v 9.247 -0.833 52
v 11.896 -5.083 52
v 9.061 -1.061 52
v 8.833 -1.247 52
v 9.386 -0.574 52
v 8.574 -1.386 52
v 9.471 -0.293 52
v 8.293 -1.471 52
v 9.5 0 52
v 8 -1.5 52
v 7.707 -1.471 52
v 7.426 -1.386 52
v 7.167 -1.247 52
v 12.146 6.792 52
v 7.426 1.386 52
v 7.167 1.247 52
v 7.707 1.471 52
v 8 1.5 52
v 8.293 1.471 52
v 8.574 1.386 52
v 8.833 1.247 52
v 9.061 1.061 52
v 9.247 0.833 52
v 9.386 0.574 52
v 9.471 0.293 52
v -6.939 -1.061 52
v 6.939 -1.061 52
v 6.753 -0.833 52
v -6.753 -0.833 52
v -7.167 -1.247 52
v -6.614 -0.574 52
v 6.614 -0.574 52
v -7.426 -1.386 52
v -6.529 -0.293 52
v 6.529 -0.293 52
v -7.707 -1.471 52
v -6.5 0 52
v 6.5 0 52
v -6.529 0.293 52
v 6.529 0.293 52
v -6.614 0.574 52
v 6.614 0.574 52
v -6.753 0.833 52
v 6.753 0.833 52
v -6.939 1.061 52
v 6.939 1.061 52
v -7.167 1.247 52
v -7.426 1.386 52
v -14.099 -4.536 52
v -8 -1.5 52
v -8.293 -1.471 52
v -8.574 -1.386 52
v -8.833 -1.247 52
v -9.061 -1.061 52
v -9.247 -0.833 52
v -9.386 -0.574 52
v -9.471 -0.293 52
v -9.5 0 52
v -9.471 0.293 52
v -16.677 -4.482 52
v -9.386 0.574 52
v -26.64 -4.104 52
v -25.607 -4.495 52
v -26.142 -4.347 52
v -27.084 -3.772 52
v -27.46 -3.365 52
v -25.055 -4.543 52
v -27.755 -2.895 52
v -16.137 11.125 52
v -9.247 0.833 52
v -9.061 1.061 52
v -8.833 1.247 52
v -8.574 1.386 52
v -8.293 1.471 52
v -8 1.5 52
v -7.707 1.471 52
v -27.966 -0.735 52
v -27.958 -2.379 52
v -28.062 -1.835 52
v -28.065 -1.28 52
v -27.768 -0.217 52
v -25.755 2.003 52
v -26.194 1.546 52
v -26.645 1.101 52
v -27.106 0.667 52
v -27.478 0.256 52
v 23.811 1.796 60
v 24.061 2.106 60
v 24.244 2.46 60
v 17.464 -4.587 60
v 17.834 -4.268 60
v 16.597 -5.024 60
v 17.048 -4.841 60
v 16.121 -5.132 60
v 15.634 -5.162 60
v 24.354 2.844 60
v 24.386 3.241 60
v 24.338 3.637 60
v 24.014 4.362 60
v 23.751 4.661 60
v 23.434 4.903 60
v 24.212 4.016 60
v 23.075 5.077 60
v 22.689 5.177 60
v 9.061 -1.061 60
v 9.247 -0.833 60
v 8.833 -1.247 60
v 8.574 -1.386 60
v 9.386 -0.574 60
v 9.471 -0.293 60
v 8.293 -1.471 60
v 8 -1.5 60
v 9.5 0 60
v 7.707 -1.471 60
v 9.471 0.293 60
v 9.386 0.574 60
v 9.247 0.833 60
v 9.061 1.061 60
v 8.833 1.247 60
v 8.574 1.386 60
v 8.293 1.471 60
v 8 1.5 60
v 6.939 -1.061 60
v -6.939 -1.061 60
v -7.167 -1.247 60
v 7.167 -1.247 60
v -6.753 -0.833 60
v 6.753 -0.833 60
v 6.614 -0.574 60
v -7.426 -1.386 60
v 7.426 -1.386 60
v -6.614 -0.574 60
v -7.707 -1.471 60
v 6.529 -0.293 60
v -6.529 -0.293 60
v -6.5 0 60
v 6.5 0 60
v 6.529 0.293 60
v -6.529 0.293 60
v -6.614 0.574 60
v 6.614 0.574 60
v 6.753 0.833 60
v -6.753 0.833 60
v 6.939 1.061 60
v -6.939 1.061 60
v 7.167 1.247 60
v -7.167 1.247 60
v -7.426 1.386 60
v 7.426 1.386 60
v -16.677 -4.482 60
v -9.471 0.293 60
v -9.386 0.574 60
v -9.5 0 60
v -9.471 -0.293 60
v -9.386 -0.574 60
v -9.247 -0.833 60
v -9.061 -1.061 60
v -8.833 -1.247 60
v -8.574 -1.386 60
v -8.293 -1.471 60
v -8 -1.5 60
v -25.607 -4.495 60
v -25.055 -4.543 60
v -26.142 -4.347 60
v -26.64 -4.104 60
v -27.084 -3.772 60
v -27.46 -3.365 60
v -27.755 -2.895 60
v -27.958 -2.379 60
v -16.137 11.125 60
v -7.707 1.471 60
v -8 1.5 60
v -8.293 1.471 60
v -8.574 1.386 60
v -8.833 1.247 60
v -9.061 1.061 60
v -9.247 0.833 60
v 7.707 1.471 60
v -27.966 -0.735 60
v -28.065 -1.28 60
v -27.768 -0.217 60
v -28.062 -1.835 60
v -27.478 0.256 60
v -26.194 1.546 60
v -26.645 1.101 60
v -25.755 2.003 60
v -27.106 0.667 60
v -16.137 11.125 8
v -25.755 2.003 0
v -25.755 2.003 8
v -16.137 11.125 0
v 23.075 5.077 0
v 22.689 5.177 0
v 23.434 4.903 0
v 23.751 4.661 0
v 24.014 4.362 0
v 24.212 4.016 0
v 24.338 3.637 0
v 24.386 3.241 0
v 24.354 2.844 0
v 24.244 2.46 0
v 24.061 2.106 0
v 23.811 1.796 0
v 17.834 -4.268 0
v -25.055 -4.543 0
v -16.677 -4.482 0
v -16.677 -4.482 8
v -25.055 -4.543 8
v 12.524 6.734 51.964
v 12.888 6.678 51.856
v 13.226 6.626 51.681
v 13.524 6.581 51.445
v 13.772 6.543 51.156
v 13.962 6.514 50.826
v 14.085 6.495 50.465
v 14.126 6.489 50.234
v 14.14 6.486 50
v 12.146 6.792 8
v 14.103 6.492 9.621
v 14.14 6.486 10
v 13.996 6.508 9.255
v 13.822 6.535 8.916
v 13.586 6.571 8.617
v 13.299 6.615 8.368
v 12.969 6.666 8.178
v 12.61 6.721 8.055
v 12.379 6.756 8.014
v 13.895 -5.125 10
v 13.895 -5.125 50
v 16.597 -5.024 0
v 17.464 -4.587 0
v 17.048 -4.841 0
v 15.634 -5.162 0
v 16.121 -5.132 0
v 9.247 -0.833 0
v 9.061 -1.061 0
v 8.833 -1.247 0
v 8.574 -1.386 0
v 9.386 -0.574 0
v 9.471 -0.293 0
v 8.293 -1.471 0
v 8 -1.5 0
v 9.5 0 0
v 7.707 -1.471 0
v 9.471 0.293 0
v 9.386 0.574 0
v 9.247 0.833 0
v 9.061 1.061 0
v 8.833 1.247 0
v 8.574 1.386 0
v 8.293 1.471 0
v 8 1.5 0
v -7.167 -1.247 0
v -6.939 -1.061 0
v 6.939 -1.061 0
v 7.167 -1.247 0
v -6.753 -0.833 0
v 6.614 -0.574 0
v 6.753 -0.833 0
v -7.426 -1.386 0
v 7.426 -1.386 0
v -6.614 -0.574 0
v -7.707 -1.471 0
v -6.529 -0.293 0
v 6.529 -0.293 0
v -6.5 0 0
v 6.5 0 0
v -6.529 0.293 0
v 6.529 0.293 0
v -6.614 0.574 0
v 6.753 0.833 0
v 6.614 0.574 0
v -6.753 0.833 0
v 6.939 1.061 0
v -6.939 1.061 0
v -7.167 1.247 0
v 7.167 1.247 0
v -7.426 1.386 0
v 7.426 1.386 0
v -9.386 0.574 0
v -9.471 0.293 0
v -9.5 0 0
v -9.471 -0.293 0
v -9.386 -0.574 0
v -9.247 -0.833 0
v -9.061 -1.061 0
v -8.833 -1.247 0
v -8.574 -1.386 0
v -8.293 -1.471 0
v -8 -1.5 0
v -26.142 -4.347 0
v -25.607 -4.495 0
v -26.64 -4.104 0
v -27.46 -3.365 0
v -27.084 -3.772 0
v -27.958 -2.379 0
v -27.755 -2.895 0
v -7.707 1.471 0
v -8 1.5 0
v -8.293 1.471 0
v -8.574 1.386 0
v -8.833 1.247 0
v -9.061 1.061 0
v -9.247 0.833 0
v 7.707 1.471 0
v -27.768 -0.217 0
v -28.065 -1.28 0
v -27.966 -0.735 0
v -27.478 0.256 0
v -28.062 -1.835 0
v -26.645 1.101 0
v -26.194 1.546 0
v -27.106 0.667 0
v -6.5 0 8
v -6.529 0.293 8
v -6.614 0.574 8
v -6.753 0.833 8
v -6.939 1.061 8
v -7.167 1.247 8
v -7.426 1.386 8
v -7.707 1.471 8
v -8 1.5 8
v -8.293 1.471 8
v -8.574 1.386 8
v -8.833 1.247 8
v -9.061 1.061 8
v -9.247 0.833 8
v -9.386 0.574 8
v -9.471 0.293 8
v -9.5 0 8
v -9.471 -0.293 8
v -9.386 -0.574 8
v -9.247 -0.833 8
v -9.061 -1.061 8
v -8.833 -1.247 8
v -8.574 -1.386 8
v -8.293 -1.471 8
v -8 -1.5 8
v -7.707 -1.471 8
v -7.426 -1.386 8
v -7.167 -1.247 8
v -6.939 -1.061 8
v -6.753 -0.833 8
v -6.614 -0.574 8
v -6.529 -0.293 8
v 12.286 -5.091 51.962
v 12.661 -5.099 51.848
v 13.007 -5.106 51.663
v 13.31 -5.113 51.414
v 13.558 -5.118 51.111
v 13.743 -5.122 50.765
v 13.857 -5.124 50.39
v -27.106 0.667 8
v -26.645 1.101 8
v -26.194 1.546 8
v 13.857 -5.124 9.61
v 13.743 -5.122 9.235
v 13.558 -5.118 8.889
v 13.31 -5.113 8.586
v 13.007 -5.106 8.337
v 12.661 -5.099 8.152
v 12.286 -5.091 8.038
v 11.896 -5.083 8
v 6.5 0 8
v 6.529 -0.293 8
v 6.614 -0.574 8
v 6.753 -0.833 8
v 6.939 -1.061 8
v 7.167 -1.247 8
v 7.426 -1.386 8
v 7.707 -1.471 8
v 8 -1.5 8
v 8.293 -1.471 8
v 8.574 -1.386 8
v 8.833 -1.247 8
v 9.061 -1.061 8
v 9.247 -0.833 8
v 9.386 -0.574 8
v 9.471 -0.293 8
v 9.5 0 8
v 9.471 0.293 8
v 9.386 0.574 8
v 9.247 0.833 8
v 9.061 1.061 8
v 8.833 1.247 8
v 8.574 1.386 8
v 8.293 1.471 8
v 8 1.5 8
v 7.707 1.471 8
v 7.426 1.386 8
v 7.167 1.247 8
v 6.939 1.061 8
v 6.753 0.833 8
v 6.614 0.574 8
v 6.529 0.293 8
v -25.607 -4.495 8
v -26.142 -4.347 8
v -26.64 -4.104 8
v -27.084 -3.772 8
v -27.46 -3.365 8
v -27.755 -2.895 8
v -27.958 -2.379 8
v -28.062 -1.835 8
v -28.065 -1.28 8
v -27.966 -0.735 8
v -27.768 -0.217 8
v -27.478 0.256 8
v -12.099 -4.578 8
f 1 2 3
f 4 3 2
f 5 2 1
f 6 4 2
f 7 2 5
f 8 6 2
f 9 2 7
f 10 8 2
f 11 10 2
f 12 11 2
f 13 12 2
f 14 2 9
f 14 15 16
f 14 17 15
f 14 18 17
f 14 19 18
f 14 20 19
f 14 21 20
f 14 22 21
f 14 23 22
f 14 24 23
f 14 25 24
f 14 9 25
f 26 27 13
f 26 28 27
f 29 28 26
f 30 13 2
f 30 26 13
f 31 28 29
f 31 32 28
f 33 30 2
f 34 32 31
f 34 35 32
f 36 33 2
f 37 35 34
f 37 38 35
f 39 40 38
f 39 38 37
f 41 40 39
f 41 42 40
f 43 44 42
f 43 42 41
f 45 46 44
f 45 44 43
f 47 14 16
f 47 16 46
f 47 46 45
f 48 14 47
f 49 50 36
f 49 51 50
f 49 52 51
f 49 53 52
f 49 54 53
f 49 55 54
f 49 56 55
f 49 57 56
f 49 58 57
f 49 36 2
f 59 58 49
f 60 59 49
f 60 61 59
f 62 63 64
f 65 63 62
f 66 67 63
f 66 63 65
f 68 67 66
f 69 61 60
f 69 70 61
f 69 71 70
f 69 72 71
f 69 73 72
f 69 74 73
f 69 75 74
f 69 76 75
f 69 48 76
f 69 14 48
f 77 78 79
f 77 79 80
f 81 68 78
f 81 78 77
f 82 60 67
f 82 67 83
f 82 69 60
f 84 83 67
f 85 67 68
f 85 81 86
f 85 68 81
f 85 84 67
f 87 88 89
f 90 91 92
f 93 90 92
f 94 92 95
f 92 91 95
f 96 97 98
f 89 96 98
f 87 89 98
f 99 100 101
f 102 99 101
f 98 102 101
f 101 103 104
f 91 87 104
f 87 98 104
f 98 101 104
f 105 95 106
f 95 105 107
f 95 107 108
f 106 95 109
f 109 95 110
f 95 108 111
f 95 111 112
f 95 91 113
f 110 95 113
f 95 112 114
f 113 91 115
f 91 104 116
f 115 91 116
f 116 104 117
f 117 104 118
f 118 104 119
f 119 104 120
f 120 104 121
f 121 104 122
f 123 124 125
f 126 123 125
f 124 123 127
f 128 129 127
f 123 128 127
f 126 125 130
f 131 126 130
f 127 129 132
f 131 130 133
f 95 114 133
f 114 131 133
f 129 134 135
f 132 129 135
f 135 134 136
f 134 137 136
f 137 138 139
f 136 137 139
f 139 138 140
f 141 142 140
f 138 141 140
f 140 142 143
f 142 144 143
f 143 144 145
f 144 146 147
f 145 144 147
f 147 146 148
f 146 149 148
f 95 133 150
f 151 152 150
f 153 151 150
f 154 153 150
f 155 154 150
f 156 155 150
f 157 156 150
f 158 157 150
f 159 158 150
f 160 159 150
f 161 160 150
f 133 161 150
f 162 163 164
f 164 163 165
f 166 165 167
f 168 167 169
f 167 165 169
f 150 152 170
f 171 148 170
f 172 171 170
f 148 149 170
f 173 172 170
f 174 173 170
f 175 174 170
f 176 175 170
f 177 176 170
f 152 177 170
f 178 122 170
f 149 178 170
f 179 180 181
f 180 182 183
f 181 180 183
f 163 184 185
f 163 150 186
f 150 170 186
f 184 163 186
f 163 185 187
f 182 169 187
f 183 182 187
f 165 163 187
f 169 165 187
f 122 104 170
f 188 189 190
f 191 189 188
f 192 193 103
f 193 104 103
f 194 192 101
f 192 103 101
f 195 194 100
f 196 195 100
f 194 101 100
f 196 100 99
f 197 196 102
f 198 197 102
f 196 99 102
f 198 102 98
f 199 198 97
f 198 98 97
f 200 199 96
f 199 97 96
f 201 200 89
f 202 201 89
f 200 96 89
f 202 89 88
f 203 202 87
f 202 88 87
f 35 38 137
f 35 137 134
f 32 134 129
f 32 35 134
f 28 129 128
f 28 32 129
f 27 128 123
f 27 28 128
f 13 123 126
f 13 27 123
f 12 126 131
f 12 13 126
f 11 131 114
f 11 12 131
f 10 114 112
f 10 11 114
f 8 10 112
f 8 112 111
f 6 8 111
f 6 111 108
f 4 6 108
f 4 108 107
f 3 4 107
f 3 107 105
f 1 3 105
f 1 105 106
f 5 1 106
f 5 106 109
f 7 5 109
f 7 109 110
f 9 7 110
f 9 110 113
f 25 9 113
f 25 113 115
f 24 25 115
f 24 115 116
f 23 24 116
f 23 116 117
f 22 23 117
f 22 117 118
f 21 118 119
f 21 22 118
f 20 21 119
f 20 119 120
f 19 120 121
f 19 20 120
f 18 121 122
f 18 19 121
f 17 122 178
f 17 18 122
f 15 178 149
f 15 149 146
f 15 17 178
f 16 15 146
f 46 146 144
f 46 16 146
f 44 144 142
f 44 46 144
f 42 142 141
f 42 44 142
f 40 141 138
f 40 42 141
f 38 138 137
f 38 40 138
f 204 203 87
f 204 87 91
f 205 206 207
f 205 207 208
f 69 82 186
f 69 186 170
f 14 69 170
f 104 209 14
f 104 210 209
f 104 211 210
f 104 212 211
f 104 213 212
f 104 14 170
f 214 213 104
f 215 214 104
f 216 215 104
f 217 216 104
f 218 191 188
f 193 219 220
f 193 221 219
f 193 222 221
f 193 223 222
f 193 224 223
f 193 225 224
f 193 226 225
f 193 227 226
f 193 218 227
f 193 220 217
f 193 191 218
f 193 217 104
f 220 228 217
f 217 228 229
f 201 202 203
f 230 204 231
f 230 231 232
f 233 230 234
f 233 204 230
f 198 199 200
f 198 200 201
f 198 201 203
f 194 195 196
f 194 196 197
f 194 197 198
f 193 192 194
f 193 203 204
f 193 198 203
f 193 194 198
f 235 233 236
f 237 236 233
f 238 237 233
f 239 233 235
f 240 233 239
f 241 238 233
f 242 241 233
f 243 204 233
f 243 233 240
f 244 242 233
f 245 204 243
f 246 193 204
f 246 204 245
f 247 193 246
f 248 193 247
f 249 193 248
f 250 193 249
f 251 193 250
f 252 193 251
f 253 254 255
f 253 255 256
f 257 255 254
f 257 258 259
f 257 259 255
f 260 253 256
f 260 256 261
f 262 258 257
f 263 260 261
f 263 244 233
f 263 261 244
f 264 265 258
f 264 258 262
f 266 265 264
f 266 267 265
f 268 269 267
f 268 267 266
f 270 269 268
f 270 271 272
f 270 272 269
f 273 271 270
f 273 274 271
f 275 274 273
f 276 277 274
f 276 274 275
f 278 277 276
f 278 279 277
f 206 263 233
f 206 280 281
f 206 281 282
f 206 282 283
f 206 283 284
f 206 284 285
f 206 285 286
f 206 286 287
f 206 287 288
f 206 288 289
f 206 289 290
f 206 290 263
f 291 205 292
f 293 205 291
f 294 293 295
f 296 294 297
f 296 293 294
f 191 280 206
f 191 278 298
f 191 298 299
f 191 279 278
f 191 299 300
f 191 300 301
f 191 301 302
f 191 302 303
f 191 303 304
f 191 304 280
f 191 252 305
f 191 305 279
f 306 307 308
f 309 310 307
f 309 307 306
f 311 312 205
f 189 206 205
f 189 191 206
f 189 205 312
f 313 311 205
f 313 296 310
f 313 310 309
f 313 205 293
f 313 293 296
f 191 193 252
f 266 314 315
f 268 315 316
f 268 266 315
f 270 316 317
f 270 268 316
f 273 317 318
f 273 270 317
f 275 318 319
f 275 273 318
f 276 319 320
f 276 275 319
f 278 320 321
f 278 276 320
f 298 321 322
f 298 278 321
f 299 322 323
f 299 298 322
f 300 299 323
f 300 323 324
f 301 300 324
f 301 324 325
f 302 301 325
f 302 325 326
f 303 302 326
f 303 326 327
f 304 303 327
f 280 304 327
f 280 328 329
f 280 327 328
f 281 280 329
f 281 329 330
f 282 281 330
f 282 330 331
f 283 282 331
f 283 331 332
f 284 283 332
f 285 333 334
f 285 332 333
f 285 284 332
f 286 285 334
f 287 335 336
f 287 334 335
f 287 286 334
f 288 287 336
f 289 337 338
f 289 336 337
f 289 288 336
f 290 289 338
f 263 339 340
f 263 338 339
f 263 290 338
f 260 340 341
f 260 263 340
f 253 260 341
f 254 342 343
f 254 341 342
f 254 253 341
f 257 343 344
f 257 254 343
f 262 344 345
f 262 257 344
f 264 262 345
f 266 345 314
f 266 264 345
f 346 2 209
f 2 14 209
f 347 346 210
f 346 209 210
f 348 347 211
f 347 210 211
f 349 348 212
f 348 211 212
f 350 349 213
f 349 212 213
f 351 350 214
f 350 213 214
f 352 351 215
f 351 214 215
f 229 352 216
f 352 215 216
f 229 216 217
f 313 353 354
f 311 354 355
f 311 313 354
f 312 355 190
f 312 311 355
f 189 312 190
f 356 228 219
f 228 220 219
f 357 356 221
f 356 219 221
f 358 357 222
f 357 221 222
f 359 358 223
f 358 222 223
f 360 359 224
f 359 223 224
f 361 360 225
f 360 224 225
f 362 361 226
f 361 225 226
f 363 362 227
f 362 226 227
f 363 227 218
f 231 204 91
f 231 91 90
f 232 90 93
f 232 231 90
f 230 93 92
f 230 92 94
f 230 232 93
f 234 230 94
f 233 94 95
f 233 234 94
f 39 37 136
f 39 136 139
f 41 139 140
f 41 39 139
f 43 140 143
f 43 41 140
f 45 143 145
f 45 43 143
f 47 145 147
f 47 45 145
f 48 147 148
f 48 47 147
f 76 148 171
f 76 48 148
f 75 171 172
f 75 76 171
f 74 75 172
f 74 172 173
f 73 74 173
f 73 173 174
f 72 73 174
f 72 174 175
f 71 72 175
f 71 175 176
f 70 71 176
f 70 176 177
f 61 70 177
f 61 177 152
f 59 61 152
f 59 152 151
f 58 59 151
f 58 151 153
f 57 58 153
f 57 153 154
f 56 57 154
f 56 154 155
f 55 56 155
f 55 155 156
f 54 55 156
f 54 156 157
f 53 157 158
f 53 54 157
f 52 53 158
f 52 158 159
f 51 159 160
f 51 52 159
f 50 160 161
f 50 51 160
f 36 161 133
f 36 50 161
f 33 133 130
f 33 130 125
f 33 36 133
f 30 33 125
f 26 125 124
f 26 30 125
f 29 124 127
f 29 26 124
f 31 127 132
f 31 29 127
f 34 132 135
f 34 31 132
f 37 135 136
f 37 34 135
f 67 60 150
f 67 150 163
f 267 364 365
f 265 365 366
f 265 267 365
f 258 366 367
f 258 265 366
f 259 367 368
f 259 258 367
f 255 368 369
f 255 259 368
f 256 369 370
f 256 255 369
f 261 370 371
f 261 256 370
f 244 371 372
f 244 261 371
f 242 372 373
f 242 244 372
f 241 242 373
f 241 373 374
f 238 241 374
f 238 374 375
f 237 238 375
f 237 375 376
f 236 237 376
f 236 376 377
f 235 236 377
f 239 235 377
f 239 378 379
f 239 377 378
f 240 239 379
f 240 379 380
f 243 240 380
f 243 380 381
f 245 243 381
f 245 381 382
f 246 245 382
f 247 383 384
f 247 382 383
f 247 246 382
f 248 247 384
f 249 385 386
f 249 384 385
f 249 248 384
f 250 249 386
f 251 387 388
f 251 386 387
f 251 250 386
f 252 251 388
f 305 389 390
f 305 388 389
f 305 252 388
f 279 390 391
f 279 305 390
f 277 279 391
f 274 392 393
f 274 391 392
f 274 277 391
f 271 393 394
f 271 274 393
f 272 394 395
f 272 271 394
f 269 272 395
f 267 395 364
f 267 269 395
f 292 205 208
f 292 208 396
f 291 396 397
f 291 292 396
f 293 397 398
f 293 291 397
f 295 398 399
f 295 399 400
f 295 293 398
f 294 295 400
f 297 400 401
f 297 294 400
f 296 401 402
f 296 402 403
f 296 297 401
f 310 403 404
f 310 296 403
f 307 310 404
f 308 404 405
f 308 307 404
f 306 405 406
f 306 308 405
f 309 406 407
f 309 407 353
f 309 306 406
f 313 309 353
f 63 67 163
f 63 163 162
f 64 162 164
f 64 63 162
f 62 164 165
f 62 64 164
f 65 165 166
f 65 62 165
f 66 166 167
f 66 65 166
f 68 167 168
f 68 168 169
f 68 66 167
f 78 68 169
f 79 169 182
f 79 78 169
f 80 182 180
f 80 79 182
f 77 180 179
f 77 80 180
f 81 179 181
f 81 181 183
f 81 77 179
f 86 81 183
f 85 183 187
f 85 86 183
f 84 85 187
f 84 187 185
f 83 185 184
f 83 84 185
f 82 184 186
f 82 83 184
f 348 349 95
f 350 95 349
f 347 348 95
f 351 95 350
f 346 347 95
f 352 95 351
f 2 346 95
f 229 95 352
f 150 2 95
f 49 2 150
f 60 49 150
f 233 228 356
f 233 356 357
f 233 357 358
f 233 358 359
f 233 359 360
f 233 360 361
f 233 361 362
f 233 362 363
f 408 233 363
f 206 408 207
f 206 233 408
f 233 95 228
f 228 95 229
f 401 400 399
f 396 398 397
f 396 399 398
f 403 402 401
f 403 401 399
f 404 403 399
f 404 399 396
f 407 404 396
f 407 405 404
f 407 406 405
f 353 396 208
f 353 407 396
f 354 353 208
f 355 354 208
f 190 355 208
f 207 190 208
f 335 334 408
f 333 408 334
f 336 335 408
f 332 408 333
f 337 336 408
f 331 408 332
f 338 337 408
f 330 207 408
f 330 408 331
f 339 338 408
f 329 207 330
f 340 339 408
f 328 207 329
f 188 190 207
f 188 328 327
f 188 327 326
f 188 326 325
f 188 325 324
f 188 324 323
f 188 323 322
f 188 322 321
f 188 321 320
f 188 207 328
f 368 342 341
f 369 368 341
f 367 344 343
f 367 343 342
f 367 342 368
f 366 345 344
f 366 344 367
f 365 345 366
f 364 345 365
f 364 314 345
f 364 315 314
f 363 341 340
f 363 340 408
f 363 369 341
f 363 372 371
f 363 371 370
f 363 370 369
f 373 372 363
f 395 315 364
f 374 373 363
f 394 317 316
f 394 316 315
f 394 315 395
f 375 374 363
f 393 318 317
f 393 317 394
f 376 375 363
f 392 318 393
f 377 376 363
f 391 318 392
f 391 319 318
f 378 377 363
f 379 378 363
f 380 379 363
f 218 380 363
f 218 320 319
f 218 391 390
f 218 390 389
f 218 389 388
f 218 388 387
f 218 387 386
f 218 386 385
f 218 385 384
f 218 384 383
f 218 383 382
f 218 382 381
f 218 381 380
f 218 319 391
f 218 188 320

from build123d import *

# Parameters (mm, degrees)
SKETCH_1_W               = 25.57090008
SKETCH_1_H               = 8
SKETCH_1_R               = 1.5
EXTRUDE_1_DEPTH          = 60
SKETCH_2_W               = 25.57090008
SKETCH_2_H               = 8
EXTRUDE_2_DEPTH          = 60
SKETCH_3_W               = 28
SKETCH_3_H               = 44
CUT_EXTRUDE_1_DEPTH      = 69.0968921
FILLET_3_R               = 2
CUT_EXTRUDE_3_DEPTH      = 69.043275984
CUT_EXTRUDE_3_DEPTH_BACK = 69.043275984
SKETCH_5_W               = 19.965389019
SKETCH_5_H               = 10
SKETCH_5_W_2             = 8.378102734
SKETCH_5_W_3             = 2.578087264
SKETCH_5_W_4             = 4.306688818
FILLET_4_R               = 2
CUT_EXTRUDE_4_DEPTH      = 69.043275984
CUT_EXTRUDE_4_DEPTH_BACK = 69.043275984
SKETCH_6_W               = 44.193811727
SKETCH_6_H               = 36.690121775


with BuildPart() as part:
    # 草图1 → 凸台-拉伸1 (new body)
    with BuildSketch(Plane.XY):
        Rectangle(SKETCH_1_W, SKETCH_1_H)
        with Locations((-8, 0)):
            Circle(SKETCH_1_R, mode=Mode.SUBTRACT)
        with Locations(Location((8, 0, 0), (0, 0, 180))):
            Circle(SKETCH_1_R, mode=Mode.SUBTRACT)
    extrude(amount=EXTRUDE_1_DEPTH)

    # 草图2 → 凸台-拉伸2 (add)
    with BuildSketch(Plane(origin=(0, 0, 0), x_dir=(-1, 0, 0), z_dir=(0, 0, -1))):
        with BuildLine():
            Line((16.137009301, 11.124937293), (-26.558542517, 4.58378843))
            Line((-26.558542517, 4.58378843), (-17.833909304, -4.268253789))
            ThreePointArc((-17.833909304, -4.268253789), (-16.826188208, -4.941851182), (-15.634172765, -5.161702124))
            Line((-15.634172765, -5.161702124), (16.6770718, -4.481988152))
            Line((16.6770718, -4.481988152), (25.054954432, -4.542717367))
            ThreePointArc((25.054954432, -4.542717367), (27.868152877, -2.64179187), (27.105933567, 0.666776546))
            ThreePointArc((27.105933567, 0.666776546), (26.418024583, 1.322314845), (25.754738639, 2.002756605))
            Line((25.754738639, 2.002756605), (16.137009301, 11.124937293))
        make_face()
        Rectangle(SKETCH_2_W, SKETCH_2_H, mode=Mode.SUBTRACT)
    extrude(amount=-EXTRUDE_2_DEPTH)

    # 草图3 → 切除-拉伸1 (cut, through all)
    with BuildSketch(Plane(origin=(-0.101620306, -4.830676855, 0), x_dir=(0.9997788072376046, -0.02103179969837793, 0), z_dir=(-0.02103179969837793, -0.9997788072376046, 0))):
        with Locations((0, 30)):
            Rectangle(SKETCH_3_W, SKETCH_3_H)
    extrude(amount=-CUT_EXTRUDE_1_DEPTH, mode=Mode.SUBTRACT)

    # 圆角3
    fillet_3_edges = [part.edges().sort_by_distance(p)[0] for p in [
        (26.558542517, 4.58378843, 30),
    ]]
    fillet(fillet_3_edges, radius=FILLET_3_R)

    # 草图5 → 切除-拉伸3 (cut, two sides: drawn at the far end of the back side and taken through both)
    with BuildSketch(Plane(origin=(0.031610884, -4.360871013, 0), x_dir=(0.9999737288141071, 0.007248564106812576, 0), z_dir=(0.007248564106812577, -0.9999737288141072, 0)).offset(-CUT_EXTRUDE_3_DEPTH_BACK)):
        with Locations((-35.069918896, 47)):
            Rectangle(SKETCH_5_W, SKETCH_5_H)
        with Locations((-20.898173019, 47)):
            Rectangle(SKETCH_5_W_2, SKETCH_5_H)
        with Locations((-15.42007802, 47)):
            Rectangle(SKETCH_5_W_3, SKETCH_5_H)
        with Locations((-11.977689979, 47)):
            Rectangle(SKETCH_5_W_4, SKETCH_5_H)
    extrude(amount=CUT_EXTRUDE_3_DEPTH + CUT_EXTRUDE_3_DEPTH_BACK, mode=Mode.SUBTRACT)

    # 圆角4
    fillet_4_edges = [part.edges().sort_by_distance(p)[0] for p in [
        (14.017415967, 0.680655778, 52),
        (14.017415967, 0.680655778, 8),
        (-13.937599421, 3.113545967, 8),
    ]]
    fillet(fillet_4_edges, radius=FILLET_4_R)

    # 草图6 → 切除-拉伸4 (cut, two sides: drawn at the far end of the back side and taken through both)
    with BuildSketch(Plane(origin=(0.031610884, -4.360871013, 0), x_dir=(0.9999737288141071, 0.007248564106812576, 0), z_dir=(0.007248564106812577, -0.9999737288141072, 0)).offset(-CUT_EXTRUDE_4_DEPTH_BACK)):
        with Locations((-28.444987659, 26.345060888)):
            Rectangle(SKETCH_6_W, SKETCH_6_H)
    extrude(amount=CUT_EXTRUDE_4_DEPTH + CUT_EXTRUDE_4_DEPTH_BACK, mode=Mode.SUBTRACT)


solid = part.part
